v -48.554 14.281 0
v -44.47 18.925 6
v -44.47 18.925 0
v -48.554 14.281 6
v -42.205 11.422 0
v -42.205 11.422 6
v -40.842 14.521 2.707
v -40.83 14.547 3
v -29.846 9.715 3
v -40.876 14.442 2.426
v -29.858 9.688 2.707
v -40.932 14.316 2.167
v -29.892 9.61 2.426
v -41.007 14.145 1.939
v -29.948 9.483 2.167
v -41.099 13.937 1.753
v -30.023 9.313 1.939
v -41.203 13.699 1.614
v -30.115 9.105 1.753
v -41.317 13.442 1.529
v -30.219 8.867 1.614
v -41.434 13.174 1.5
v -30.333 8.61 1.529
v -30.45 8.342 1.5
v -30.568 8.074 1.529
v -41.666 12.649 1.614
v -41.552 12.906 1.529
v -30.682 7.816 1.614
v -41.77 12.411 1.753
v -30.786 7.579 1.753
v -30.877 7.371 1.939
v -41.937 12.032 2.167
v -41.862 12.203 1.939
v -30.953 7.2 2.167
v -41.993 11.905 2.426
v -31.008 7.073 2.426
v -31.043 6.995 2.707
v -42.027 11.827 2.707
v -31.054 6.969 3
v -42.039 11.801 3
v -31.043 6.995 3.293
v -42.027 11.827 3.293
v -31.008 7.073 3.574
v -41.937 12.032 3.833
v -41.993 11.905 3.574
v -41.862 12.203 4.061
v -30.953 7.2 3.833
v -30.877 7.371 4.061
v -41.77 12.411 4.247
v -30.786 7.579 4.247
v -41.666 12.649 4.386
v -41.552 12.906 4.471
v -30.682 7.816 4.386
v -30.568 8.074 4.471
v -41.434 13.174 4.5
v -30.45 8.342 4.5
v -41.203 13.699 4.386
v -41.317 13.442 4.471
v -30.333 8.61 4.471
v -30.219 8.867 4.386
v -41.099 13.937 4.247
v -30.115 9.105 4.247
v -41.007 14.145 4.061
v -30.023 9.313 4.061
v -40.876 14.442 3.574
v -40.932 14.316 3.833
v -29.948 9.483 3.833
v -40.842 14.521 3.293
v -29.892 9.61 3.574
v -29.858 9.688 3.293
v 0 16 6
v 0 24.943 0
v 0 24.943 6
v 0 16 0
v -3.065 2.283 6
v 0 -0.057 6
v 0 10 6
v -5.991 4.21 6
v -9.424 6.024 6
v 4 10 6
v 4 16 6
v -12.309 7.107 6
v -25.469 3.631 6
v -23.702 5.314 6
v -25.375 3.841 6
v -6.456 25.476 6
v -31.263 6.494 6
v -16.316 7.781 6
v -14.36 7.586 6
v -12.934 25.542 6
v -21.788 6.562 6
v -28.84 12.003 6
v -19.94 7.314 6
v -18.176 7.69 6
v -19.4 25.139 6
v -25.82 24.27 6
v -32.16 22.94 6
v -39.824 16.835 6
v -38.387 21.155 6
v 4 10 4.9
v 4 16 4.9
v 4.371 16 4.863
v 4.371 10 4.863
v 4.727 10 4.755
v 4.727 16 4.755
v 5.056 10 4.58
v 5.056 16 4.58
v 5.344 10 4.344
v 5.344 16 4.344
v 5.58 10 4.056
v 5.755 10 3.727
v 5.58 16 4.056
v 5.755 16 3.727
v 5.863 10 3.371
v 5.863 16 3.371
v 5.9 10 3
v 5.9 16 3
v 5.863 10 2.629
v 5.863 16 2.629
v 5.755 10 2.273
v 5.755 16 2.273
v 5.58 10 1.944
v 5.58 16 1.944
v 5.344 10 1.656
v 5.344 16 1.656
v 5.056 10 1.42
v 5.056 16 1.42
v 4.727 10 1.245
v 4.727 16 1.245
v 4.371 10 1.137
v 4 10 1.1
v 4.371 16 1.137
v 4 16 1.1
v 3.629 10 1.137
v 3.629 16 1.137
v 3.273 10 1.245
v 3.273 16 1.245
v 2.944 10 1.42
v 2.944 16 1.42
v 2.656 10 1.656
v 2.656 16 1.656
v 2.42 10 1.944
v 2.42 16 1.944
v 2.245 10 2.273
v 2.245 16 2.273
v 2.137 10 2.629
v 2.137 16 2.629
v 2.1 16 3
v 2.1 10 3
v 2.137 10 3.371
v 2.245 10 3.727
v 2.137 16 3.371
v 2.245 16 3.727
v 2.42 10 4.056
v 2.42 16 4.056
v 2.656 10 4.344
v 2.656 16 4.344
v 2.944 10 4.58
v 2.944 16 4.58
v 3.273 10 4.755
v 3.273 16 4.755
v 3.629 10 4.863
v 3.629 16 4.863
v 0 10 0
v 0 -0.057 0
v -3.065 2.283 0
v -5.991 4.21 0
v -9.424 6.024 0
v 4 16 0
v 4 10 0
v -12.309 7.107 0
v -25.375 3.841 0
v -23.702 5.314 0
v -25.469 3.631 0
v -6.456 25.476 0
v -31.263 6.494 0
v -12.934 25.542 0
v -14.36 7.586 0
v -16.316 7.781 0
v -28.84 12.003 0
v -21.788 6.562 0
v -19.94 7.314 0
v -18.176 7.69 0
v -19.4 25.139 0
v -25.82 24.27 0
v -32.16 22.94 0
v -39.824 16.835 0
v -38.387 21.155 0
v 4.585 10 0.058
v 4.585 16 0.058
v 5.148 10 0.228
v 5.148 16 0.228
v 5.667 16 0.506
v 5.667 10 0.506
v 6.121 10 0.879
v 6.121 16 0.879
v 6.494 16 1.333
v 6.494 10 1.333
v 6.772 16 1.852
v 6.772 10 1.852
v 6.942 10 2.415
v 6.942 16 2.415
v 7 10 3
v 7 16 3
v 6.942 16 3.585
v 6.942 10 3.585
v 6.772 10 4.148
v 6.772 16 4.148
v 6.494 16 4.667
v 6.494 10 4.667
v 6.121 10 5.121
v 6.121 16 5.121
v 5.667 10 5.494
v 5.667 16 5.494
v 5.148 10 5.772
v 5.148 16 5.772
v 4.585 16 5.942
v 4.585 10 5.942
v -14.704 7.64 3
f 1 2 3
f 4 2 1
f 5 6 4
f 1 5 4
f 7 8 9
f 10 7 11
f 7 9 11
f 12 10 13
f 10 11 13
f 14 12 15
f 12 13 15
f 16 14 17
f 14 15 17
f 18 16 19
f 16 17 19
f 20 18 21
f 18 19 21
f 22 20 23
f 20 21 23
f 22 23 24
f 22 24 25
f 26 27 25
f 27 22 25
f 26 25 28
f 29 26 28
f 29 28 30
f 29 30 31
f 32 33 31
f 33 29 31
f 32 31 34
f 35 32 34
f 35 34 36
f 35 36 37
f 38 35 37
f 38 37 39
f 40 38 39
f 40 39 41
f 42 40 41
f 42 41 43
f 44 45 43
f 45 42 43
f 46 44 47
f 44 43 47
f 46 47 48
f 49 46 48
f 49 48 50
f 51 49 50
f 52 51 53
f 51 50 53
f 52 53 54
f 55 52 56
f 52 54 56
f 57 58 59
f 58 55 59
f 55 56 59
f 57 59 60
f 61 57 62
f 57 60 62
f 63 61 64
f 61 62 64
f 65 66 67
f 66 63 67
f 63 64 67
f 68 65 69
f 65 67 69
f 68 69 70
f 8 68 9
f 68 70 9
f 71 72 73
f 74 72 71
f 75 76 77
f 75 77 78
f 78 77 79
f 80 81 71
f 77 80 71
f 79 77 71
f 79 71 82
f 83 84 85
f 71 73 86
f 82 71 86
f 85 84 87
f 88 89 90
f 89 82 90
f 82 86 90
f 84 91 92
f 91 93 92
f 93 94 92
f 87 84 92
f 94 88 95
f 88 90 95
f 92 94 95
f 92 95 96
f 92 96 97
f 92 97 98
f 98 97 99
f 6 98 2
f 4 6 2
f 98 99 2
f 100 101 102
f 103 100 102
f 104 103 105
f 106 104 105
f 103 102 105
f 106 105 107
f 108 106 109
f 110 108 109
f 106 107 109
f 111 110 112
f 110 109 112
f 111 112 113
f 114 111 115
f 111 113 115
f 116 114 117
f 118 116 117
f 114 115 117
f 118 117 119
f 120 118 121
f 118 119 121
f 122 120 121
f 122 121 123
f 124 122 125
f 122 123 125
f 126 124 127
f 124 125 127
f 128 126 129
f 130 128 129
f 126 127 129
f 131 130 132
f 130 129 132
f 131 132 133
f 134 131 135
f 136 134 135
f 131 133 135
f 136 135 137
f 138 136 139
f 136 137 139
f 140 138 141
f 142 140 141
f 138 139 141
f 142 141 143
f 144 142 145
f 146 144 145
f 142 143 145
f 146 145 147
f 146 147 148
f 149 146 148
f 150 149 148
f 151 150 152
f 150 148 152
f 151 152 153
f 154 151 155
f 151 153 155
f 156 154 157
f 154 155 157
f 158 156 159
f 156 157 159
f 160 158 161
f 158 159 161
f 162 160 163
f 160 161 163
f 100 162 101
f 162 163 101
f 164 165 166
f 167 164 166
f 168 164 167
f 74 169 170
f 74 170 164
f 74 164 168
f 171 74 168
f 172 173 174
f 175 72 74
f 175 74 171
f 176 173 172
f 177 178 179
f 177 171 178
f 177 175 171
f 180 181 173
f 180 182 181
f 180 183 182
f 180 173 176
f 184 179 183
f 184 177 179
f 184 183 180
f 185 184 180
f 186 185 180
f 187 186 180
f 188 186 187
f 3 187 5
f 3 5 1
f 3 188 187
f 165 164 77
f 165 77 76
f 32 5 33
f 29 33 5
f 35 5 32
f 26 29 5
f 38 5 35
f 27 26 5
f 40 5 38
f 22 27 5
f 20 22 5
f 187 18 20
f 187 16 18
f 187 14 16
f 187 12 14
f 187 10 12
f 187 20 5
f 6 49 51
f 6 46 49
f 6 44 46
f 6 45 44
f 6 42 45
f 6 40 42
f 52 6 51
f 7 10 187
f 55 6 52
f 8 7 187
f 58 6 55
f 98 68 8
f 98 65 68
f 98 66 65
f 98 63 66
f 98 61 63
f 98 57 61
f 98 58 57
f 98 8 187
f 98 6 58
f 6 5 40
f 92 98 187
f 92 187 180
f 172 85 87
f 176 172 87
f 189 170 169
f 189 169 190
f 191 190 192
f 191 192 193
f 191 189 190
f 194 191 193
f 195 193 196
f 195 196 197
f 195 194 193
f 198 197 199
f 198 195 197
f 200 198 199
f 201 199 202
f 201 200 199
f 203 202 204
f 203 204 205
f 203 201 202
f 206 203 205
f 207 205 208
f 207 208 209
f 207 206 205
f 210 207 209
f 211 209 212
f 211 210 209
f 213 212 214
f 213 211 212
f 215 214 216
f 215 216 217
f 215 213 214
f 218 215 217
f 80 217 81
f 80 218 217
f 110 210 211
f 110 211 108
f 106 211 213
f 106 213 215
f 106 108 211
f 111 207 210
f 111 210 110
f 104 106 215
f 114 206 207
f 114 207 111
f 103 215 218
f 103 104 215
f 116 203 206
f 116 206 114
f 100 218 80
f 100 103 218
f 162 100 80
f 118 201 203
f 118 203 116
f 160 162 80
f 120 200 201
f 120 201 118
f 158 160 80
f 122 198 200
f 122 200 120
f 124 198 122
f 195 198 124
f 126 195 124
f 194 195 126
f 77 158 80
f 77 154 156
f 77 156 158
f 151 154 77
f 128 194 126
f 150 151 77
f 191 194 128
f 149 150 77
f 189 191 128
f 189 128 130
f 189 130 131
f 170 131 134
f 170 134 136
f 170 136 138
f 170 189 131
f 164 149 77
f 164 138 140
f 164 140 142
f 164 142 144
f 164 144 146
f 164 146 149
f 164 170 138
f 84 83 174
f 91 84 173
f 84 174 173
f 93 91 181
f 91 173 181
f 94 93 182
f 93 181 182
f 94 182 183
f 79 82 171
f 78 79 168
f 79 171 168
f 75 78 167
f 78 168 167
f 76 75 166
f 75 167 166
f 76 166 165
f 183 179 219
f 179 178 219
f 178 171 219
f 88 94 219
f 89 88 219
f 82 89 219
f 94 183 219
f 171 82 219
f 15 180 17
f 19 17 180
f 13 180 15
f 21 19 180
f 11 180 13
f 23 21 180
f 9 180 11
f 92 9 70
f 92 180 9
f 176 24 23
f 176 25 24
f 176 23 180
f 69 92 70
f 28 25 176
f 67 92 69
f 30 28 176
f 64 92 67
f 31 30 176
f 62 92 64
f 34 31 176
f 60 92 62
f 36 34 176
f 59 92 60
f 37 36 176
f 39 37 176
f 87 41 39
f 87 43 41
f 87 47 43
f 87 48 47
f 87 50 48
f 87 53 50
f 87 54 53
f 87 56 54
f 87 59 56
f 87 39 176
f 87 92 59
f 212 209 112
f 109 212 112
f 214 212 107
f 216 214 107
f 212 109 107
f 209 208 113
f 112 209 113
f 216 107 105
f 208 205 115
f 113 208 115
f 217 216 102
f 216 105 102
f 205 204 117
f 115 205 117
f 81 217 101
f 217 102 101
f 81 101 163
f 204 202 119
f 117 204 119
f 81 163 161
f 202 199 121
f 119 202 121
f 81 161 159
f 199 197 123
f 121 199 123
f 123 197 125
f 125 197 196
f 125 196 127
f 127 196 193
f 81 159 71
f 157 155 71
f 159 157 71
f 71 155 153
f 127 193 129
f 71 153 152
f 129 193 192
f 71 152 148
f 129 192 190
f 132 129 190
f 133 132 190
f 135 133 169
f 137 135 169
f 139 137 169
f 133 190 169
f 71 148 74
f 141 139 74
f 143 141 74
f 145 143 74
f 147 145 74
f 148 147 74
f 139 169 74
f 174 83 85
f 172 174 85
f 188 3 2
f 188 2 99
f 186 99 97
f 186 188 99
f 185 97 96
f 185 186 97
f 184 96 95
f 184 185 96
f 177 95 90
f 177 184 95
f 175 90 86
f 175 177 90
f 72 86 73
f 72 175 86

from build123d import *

# Parameters (mm, degrees)
SALIENTE_EXTRUIR1_DEPTH = 6
CORTAR_EXTRUIR2_DEPTH   = 10
SALIENTE_EXTRUIR2_REACH = 33.971
CROQUIS3_R              = 1.5
SALIENTE_EXTRUIR3_START = 10
SALIENTE_EXTRUIR3_DEPTH = 6
CROQUIS5_R              = 1.9
CORTAR_EXTRUIR3_DEPTH   = 6
CORTAR_EXTRUIR4_DEPTH   = 10
CORTAR_EXTRUIR8_DEPTH   = 10


with BuildPart() as part:
    # Croquis1 → Saliente-Extruir1 (new body)
    with BuildSketch(Plane.XY):
        with BuildLine():
            Line((-26.569033706, 2.264395111), (-54.029300138, 14.344700052))
            ThreePointArc((-54.029300138, 14.344700052), (-27.848836662, 23.896462082), (0, 24.942942963))
            Line((0, 24.942942963), (0, -0.057057037))
            add(Edge.make_bspline(
                [(-26.569033706, 2.264395111), (-17.747364857, 14.365738672), (0, -0.057057037)],
                knots=[0, 0, 0, 1, 1, 1], degree=2))
        make_face()
    extrude(amount=SALIENTE_EXTRUIR1_DEPTH)

    # Croquis2 → Cortar-Extruir2 (cut)
    with BuildSketch(Plane.XY.offset(6)):
        Polygon((-43.045193565, 9.512578075), (-39.823778914, 16.835315791), (-28.839672341, 12.003193814), (-32.061086993, 4.680456099), align=None)
    extrude(amount=-CORTAR_EXTRUIR2_DEPTH, mode=Mode.SUBTRACT)

    # Croquis3 → Saliente-Extruir2 (add, up to next)
    with BuildSketch(Plane(origin=(-28.587581395, 12.576232705, 0), x_dir=(0, 0, 1), z_dir=(-0.915342214401337, 0.4026768313857366, 0)), mode=Mode.PRIVATE) as saliente_extruir2_sk1:
        with Locations(Location((3, -4.626037871, 0), (0, 0, 90))):
            Circle(CROQUIS3_R)
    saliente_extruir2_tool1 = extrude(saliente_extruir2_sk1.sketch, amount=SALIENTE_EXTRUIR2_REACH, mode=Mode.PRIVATE) - part.part
    add(saliente_extruir2_tool1.solids().sort_by_distance((-30.45038, 8.341825, 3))[0])

    # Croquis4 → Saliente-Extruir3 (add)
    with BuildSketch(Plane(origin=(0, 0, 0), x_dir=(1, 0, 0), z_dir=(0, 1, 0)).offset(SALIENTE_EXTRUIR3_START)):
        with BuildLine():
            Line((0, 0), (4, 0))
            ThreePointArc((4, 0), (7, -3), (4, -6))
            Line((4, -6), (0, -6))
            Line((0, -6), (0, 0))
        make_face()
    extrude(amount=SALIENTE_EXTRUIR3_DEPTH)

    # Croquis5 → Cortar-Extruir3 (cut)
    with BuildSketch(Plane(origin=(0, 16, 0), x_dir=(1, 0, 0), z_dir=(0, 1, 0))):
        with Locations(Location((4, -3, 0), (0, 0, 270))):
            Circle(CROQUIS5_R)
    extrude(amount=-CORTAR_EXTRUIR3_DEPTH, mode=Mode.SUBTRACT)

    # Croquis6 → Cortar-Extruir4 (cut)
    with BuildSketch(Plane.XY.offset(6)):
        Polygon((-54.217314507, 14.240228789), (-26.345009663, 1.686933832), (-25.374680505, 3.841372979), (-53.24698535, 16.394667936), align=None)
    extrude(amount=-CORTAR_EXTRUIR4_DEPTH, mode=Mode.SUBTRACT)

    # Croquis7 → Cortar-Extruir8 (cut)
    with BuildSketch(Plane.XY.offset(6)):
        with BuildLine():
            Line((-44.469656668, 18.924767513), (-48.553751341, 14.280901201))
            ThreePointArc((-48.553751341, 14.280901201), (-47.473480209, 17.448678059), (-44.469656668, 18.924767513))
        make_face()
    extrude(amount=-CORTAR_EXTRUIR8_DEPTH, mode=Mode.SUBTRACT)


with BuildPart() as body_2:
    # of the pieces the cut leaves, the one that is kept (cortar_extruir8_keep)
    add(part.part.solids().sort_by_distance((0, 24.942942963, 0))[0])


solid = body_2.part
